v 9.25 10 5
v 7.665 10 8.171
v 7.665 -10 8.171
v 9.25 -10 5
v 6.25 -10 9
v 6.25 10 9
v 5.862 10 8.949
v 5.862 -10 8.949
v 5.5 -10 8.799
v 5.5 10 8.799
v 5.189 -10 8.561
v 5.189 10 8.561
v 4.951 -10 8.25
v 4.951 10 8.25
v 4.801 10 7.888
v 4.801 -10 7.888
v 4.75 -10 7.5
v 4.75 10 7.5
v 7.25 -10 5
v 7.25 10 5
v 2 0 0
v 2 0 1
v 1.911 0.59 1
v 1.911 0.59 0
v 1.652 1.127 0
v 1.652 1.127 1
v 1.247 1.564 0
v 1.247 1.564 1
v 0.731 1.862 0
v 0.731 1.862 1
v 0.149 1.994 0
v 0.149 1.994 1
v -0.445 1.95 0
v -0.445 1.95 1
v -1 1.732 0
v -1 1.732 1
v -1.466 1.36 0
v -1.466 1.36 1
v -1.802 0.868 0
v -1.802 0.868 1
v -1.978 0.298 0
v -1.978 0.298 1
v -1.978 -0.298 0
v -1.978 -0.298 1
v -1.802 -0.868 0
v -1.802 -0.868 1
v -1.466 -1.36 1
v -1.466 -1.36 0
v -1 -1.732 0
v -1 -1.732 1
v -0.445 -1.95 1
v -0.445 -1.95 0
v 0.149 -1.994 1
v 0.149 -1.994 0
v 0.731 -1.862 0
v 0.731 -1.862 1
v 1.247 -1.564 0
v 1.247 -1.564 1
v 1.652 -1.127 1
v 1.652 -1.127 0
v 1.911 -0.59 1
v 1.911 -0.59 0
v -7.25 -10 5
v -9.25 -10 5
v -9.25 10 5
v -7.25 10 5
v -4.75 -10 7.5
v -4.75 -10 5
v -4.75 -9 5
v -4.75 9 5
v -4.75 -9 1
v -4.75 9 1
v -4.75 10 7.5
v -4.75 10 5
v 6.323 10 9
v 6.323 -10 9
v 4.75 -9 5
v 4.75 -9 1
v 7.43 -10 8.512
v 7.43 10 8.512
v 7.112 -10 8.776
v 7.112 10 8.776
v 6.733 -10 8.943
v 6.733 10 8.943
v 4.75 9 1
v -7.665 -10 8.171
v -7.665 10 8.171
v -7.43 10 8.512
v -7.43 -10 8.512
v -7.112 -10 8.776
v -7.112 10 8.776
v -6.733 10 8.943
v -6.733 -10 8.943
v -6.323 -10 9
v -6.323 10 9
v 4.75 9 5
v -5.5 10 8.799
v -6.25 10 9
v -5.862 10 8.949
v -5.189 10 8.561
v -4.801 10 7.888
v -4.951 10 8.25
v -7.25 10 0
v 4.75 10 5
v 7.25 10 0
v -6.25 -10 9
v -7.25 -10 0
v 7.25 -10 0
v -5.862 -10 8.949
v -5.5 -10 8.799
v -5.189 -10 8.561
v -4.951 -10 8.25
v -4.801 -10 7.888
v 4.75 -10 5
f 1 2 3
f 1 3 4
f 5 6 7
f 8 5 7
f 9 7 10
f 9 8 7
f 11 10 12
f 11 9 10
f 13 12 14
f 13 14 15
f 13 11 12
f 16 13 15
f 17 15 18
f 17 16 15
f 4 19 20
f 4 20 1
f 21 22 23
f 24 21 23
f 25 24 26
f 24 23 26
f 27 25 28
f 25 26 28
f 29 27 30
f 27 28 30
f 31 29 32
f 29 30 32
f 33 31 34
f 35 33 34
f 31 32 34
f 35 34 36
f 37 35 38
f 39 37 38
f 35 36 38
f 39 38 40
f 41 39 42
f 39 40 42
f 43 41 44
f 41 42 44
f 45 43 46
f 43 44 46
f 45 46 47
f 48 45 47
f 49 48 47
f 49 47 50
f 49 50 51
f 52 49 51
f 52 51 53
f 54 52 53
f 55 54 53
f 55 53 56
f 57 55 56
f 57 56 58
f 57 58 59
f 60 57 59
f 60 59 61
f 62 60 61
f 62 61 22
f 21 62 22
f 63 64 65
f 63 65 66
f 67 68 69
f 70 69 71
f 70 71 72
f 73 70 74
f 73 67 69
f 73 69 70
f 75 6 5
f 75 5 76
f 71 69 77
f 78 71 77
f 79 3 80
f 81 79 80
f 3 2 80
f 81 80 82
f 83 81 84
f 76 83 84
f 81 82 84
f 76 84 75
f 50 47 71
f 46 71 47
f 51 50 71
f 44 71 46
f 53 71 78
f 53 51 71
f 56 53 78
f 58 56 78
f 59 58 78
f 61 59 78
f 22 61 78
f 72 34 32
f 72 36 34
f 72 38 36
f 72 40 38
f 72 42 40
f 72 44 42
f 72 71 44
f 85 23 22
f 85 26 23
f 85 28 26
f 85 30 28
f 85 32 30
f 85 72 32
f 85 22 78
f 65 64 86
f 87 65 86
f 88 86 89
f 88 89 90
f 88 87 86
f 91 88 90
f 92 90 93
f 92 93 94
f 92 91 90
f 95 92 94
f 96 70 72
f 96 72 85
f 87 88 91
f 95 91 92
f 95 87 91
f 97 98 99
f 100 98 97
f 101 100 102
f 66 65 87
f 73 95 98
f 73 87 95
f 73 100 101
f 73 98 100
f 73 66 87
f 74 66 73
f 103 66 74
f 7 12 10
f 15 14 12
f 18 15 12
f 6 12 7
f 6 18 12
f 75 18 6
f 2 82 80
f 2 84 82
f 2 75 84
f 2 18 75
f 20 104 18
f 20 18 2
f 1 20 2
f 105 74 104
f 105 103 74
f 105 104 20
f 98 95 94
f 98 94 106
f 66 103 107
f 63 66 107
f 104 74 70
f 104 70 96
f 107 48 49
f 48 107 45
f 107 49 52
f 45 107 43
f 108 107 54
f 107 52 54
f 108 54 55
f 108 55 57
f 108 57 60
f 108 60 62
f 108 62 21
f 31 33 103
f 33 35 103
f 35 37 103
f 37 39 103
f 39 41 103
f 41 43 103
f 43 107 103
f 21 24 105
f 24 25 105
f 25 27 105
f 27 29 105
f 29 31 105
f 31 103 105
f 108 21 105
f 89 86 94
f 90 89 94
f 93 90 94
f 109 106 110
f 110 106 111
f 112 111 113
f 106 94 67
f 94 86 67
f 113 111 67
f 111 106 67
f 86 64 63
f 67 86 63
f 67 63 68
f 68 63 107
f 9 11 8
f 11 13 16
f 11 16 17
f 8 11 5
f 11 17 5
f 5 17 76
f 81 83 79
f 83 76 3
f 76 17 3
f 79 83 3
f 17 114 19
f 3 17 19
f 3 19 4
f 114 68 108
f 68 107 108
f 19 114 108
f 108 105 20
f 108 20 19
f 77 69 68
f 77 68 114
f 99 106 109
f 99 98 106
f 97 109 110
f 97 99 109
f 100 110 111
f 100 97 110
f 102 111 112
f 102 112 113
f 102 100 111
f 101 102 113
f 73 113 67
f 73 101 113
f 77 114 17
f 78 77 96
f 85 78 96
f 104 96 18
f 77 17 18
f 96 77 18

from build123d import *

# Parameters (mm, degrees)
F0_W      = 18.5
F0_H      = 20
F1_DEPTH  = 9
F2_W      = 2
F2_H      = 20
F3_DEPTH  = 5
F4_W      = 9.5
F4_H      = 18
F5_DEPTH  = 8
F6_W      = 9.5
F6_H      = 1
F7_DEPTH  = 4
F8_R      = 2
F9_DEPTH  = 25
F11_DEPTH = 20.001
F12_R     = 1.5


with BuildPart() as f1:
    # F0 (on Top) → F1 (new body)
    with BuildSketch(Plane.XY):
        Rectangle(F0_W, F0_H)
    extrude(amount=F1_DEPTH)

    # F2 (on face) → F3 (cut)
    with BuildSketch(Plane(origin=(0, 0, 0), x_dir=(1, 0, 0), z_dir=(0, 0, -1))):
        with Locations((-8.25, 0)):
            Rectangle(F2_W, F2_H)
        with Locations((8.25, 0)):
            Rectangle(F2_W, F2_H)
    extrude(amount=-F3_DEPTH, mode=Mode.SUBTRACT)

    # F4 (on face) → F5 (cut)
    with BuildSketch(Plane.XY.offset(9)):
        Rectangle(F4_W, F4_H)
    extrude(amount=-F5_DEPTH, mode=Mode.SUBTRACT)

    # F6 (on face) → F7 (cut)
    with BuildSketch(Plane.XY.offset(9)):
        with Locations((0, -9.5)):
            Rectangle(F6_W, F6_H)
        with Locations((0, 9.5)):
            Rectangle(F6_W, F6_H)
    extrude(amount=-F7_DEPTH, mode=Mode.SUBTRACT)

    # F8 (on face) → F9 (cut)
    with BuildSketch(Plane.XY.offset(1)):
        Circle(F8_R)
    extrude(amount=-F9_DEPTH, mode=Mode.SUBTRACT)

    # F10 (on face) → F11 (cut, through all)
    with BuildSketch(Plane.XZ.offset(10)):
        Polygon((-9.25, 9), (-9.25, 5), (-7.25, 9), align=None)
        Polygon((7.25, 9), (9.25, 5), (9.25, 9), align=None)
    extrude(amount=-F11_DEPTH, mode=Mode.SUBTRACT)

    # F12
    f12_edges = [f1.edges().sort_by_distance(p)[0] for p in [
        (-4.75, 0, 9),
        (-7.25, 0, 9),
        (4.75, 0, 9),
        (7.25, 0, 9),
    ]]
    fillet(f12_edges, radius=F12_R)


solid = f1.part
